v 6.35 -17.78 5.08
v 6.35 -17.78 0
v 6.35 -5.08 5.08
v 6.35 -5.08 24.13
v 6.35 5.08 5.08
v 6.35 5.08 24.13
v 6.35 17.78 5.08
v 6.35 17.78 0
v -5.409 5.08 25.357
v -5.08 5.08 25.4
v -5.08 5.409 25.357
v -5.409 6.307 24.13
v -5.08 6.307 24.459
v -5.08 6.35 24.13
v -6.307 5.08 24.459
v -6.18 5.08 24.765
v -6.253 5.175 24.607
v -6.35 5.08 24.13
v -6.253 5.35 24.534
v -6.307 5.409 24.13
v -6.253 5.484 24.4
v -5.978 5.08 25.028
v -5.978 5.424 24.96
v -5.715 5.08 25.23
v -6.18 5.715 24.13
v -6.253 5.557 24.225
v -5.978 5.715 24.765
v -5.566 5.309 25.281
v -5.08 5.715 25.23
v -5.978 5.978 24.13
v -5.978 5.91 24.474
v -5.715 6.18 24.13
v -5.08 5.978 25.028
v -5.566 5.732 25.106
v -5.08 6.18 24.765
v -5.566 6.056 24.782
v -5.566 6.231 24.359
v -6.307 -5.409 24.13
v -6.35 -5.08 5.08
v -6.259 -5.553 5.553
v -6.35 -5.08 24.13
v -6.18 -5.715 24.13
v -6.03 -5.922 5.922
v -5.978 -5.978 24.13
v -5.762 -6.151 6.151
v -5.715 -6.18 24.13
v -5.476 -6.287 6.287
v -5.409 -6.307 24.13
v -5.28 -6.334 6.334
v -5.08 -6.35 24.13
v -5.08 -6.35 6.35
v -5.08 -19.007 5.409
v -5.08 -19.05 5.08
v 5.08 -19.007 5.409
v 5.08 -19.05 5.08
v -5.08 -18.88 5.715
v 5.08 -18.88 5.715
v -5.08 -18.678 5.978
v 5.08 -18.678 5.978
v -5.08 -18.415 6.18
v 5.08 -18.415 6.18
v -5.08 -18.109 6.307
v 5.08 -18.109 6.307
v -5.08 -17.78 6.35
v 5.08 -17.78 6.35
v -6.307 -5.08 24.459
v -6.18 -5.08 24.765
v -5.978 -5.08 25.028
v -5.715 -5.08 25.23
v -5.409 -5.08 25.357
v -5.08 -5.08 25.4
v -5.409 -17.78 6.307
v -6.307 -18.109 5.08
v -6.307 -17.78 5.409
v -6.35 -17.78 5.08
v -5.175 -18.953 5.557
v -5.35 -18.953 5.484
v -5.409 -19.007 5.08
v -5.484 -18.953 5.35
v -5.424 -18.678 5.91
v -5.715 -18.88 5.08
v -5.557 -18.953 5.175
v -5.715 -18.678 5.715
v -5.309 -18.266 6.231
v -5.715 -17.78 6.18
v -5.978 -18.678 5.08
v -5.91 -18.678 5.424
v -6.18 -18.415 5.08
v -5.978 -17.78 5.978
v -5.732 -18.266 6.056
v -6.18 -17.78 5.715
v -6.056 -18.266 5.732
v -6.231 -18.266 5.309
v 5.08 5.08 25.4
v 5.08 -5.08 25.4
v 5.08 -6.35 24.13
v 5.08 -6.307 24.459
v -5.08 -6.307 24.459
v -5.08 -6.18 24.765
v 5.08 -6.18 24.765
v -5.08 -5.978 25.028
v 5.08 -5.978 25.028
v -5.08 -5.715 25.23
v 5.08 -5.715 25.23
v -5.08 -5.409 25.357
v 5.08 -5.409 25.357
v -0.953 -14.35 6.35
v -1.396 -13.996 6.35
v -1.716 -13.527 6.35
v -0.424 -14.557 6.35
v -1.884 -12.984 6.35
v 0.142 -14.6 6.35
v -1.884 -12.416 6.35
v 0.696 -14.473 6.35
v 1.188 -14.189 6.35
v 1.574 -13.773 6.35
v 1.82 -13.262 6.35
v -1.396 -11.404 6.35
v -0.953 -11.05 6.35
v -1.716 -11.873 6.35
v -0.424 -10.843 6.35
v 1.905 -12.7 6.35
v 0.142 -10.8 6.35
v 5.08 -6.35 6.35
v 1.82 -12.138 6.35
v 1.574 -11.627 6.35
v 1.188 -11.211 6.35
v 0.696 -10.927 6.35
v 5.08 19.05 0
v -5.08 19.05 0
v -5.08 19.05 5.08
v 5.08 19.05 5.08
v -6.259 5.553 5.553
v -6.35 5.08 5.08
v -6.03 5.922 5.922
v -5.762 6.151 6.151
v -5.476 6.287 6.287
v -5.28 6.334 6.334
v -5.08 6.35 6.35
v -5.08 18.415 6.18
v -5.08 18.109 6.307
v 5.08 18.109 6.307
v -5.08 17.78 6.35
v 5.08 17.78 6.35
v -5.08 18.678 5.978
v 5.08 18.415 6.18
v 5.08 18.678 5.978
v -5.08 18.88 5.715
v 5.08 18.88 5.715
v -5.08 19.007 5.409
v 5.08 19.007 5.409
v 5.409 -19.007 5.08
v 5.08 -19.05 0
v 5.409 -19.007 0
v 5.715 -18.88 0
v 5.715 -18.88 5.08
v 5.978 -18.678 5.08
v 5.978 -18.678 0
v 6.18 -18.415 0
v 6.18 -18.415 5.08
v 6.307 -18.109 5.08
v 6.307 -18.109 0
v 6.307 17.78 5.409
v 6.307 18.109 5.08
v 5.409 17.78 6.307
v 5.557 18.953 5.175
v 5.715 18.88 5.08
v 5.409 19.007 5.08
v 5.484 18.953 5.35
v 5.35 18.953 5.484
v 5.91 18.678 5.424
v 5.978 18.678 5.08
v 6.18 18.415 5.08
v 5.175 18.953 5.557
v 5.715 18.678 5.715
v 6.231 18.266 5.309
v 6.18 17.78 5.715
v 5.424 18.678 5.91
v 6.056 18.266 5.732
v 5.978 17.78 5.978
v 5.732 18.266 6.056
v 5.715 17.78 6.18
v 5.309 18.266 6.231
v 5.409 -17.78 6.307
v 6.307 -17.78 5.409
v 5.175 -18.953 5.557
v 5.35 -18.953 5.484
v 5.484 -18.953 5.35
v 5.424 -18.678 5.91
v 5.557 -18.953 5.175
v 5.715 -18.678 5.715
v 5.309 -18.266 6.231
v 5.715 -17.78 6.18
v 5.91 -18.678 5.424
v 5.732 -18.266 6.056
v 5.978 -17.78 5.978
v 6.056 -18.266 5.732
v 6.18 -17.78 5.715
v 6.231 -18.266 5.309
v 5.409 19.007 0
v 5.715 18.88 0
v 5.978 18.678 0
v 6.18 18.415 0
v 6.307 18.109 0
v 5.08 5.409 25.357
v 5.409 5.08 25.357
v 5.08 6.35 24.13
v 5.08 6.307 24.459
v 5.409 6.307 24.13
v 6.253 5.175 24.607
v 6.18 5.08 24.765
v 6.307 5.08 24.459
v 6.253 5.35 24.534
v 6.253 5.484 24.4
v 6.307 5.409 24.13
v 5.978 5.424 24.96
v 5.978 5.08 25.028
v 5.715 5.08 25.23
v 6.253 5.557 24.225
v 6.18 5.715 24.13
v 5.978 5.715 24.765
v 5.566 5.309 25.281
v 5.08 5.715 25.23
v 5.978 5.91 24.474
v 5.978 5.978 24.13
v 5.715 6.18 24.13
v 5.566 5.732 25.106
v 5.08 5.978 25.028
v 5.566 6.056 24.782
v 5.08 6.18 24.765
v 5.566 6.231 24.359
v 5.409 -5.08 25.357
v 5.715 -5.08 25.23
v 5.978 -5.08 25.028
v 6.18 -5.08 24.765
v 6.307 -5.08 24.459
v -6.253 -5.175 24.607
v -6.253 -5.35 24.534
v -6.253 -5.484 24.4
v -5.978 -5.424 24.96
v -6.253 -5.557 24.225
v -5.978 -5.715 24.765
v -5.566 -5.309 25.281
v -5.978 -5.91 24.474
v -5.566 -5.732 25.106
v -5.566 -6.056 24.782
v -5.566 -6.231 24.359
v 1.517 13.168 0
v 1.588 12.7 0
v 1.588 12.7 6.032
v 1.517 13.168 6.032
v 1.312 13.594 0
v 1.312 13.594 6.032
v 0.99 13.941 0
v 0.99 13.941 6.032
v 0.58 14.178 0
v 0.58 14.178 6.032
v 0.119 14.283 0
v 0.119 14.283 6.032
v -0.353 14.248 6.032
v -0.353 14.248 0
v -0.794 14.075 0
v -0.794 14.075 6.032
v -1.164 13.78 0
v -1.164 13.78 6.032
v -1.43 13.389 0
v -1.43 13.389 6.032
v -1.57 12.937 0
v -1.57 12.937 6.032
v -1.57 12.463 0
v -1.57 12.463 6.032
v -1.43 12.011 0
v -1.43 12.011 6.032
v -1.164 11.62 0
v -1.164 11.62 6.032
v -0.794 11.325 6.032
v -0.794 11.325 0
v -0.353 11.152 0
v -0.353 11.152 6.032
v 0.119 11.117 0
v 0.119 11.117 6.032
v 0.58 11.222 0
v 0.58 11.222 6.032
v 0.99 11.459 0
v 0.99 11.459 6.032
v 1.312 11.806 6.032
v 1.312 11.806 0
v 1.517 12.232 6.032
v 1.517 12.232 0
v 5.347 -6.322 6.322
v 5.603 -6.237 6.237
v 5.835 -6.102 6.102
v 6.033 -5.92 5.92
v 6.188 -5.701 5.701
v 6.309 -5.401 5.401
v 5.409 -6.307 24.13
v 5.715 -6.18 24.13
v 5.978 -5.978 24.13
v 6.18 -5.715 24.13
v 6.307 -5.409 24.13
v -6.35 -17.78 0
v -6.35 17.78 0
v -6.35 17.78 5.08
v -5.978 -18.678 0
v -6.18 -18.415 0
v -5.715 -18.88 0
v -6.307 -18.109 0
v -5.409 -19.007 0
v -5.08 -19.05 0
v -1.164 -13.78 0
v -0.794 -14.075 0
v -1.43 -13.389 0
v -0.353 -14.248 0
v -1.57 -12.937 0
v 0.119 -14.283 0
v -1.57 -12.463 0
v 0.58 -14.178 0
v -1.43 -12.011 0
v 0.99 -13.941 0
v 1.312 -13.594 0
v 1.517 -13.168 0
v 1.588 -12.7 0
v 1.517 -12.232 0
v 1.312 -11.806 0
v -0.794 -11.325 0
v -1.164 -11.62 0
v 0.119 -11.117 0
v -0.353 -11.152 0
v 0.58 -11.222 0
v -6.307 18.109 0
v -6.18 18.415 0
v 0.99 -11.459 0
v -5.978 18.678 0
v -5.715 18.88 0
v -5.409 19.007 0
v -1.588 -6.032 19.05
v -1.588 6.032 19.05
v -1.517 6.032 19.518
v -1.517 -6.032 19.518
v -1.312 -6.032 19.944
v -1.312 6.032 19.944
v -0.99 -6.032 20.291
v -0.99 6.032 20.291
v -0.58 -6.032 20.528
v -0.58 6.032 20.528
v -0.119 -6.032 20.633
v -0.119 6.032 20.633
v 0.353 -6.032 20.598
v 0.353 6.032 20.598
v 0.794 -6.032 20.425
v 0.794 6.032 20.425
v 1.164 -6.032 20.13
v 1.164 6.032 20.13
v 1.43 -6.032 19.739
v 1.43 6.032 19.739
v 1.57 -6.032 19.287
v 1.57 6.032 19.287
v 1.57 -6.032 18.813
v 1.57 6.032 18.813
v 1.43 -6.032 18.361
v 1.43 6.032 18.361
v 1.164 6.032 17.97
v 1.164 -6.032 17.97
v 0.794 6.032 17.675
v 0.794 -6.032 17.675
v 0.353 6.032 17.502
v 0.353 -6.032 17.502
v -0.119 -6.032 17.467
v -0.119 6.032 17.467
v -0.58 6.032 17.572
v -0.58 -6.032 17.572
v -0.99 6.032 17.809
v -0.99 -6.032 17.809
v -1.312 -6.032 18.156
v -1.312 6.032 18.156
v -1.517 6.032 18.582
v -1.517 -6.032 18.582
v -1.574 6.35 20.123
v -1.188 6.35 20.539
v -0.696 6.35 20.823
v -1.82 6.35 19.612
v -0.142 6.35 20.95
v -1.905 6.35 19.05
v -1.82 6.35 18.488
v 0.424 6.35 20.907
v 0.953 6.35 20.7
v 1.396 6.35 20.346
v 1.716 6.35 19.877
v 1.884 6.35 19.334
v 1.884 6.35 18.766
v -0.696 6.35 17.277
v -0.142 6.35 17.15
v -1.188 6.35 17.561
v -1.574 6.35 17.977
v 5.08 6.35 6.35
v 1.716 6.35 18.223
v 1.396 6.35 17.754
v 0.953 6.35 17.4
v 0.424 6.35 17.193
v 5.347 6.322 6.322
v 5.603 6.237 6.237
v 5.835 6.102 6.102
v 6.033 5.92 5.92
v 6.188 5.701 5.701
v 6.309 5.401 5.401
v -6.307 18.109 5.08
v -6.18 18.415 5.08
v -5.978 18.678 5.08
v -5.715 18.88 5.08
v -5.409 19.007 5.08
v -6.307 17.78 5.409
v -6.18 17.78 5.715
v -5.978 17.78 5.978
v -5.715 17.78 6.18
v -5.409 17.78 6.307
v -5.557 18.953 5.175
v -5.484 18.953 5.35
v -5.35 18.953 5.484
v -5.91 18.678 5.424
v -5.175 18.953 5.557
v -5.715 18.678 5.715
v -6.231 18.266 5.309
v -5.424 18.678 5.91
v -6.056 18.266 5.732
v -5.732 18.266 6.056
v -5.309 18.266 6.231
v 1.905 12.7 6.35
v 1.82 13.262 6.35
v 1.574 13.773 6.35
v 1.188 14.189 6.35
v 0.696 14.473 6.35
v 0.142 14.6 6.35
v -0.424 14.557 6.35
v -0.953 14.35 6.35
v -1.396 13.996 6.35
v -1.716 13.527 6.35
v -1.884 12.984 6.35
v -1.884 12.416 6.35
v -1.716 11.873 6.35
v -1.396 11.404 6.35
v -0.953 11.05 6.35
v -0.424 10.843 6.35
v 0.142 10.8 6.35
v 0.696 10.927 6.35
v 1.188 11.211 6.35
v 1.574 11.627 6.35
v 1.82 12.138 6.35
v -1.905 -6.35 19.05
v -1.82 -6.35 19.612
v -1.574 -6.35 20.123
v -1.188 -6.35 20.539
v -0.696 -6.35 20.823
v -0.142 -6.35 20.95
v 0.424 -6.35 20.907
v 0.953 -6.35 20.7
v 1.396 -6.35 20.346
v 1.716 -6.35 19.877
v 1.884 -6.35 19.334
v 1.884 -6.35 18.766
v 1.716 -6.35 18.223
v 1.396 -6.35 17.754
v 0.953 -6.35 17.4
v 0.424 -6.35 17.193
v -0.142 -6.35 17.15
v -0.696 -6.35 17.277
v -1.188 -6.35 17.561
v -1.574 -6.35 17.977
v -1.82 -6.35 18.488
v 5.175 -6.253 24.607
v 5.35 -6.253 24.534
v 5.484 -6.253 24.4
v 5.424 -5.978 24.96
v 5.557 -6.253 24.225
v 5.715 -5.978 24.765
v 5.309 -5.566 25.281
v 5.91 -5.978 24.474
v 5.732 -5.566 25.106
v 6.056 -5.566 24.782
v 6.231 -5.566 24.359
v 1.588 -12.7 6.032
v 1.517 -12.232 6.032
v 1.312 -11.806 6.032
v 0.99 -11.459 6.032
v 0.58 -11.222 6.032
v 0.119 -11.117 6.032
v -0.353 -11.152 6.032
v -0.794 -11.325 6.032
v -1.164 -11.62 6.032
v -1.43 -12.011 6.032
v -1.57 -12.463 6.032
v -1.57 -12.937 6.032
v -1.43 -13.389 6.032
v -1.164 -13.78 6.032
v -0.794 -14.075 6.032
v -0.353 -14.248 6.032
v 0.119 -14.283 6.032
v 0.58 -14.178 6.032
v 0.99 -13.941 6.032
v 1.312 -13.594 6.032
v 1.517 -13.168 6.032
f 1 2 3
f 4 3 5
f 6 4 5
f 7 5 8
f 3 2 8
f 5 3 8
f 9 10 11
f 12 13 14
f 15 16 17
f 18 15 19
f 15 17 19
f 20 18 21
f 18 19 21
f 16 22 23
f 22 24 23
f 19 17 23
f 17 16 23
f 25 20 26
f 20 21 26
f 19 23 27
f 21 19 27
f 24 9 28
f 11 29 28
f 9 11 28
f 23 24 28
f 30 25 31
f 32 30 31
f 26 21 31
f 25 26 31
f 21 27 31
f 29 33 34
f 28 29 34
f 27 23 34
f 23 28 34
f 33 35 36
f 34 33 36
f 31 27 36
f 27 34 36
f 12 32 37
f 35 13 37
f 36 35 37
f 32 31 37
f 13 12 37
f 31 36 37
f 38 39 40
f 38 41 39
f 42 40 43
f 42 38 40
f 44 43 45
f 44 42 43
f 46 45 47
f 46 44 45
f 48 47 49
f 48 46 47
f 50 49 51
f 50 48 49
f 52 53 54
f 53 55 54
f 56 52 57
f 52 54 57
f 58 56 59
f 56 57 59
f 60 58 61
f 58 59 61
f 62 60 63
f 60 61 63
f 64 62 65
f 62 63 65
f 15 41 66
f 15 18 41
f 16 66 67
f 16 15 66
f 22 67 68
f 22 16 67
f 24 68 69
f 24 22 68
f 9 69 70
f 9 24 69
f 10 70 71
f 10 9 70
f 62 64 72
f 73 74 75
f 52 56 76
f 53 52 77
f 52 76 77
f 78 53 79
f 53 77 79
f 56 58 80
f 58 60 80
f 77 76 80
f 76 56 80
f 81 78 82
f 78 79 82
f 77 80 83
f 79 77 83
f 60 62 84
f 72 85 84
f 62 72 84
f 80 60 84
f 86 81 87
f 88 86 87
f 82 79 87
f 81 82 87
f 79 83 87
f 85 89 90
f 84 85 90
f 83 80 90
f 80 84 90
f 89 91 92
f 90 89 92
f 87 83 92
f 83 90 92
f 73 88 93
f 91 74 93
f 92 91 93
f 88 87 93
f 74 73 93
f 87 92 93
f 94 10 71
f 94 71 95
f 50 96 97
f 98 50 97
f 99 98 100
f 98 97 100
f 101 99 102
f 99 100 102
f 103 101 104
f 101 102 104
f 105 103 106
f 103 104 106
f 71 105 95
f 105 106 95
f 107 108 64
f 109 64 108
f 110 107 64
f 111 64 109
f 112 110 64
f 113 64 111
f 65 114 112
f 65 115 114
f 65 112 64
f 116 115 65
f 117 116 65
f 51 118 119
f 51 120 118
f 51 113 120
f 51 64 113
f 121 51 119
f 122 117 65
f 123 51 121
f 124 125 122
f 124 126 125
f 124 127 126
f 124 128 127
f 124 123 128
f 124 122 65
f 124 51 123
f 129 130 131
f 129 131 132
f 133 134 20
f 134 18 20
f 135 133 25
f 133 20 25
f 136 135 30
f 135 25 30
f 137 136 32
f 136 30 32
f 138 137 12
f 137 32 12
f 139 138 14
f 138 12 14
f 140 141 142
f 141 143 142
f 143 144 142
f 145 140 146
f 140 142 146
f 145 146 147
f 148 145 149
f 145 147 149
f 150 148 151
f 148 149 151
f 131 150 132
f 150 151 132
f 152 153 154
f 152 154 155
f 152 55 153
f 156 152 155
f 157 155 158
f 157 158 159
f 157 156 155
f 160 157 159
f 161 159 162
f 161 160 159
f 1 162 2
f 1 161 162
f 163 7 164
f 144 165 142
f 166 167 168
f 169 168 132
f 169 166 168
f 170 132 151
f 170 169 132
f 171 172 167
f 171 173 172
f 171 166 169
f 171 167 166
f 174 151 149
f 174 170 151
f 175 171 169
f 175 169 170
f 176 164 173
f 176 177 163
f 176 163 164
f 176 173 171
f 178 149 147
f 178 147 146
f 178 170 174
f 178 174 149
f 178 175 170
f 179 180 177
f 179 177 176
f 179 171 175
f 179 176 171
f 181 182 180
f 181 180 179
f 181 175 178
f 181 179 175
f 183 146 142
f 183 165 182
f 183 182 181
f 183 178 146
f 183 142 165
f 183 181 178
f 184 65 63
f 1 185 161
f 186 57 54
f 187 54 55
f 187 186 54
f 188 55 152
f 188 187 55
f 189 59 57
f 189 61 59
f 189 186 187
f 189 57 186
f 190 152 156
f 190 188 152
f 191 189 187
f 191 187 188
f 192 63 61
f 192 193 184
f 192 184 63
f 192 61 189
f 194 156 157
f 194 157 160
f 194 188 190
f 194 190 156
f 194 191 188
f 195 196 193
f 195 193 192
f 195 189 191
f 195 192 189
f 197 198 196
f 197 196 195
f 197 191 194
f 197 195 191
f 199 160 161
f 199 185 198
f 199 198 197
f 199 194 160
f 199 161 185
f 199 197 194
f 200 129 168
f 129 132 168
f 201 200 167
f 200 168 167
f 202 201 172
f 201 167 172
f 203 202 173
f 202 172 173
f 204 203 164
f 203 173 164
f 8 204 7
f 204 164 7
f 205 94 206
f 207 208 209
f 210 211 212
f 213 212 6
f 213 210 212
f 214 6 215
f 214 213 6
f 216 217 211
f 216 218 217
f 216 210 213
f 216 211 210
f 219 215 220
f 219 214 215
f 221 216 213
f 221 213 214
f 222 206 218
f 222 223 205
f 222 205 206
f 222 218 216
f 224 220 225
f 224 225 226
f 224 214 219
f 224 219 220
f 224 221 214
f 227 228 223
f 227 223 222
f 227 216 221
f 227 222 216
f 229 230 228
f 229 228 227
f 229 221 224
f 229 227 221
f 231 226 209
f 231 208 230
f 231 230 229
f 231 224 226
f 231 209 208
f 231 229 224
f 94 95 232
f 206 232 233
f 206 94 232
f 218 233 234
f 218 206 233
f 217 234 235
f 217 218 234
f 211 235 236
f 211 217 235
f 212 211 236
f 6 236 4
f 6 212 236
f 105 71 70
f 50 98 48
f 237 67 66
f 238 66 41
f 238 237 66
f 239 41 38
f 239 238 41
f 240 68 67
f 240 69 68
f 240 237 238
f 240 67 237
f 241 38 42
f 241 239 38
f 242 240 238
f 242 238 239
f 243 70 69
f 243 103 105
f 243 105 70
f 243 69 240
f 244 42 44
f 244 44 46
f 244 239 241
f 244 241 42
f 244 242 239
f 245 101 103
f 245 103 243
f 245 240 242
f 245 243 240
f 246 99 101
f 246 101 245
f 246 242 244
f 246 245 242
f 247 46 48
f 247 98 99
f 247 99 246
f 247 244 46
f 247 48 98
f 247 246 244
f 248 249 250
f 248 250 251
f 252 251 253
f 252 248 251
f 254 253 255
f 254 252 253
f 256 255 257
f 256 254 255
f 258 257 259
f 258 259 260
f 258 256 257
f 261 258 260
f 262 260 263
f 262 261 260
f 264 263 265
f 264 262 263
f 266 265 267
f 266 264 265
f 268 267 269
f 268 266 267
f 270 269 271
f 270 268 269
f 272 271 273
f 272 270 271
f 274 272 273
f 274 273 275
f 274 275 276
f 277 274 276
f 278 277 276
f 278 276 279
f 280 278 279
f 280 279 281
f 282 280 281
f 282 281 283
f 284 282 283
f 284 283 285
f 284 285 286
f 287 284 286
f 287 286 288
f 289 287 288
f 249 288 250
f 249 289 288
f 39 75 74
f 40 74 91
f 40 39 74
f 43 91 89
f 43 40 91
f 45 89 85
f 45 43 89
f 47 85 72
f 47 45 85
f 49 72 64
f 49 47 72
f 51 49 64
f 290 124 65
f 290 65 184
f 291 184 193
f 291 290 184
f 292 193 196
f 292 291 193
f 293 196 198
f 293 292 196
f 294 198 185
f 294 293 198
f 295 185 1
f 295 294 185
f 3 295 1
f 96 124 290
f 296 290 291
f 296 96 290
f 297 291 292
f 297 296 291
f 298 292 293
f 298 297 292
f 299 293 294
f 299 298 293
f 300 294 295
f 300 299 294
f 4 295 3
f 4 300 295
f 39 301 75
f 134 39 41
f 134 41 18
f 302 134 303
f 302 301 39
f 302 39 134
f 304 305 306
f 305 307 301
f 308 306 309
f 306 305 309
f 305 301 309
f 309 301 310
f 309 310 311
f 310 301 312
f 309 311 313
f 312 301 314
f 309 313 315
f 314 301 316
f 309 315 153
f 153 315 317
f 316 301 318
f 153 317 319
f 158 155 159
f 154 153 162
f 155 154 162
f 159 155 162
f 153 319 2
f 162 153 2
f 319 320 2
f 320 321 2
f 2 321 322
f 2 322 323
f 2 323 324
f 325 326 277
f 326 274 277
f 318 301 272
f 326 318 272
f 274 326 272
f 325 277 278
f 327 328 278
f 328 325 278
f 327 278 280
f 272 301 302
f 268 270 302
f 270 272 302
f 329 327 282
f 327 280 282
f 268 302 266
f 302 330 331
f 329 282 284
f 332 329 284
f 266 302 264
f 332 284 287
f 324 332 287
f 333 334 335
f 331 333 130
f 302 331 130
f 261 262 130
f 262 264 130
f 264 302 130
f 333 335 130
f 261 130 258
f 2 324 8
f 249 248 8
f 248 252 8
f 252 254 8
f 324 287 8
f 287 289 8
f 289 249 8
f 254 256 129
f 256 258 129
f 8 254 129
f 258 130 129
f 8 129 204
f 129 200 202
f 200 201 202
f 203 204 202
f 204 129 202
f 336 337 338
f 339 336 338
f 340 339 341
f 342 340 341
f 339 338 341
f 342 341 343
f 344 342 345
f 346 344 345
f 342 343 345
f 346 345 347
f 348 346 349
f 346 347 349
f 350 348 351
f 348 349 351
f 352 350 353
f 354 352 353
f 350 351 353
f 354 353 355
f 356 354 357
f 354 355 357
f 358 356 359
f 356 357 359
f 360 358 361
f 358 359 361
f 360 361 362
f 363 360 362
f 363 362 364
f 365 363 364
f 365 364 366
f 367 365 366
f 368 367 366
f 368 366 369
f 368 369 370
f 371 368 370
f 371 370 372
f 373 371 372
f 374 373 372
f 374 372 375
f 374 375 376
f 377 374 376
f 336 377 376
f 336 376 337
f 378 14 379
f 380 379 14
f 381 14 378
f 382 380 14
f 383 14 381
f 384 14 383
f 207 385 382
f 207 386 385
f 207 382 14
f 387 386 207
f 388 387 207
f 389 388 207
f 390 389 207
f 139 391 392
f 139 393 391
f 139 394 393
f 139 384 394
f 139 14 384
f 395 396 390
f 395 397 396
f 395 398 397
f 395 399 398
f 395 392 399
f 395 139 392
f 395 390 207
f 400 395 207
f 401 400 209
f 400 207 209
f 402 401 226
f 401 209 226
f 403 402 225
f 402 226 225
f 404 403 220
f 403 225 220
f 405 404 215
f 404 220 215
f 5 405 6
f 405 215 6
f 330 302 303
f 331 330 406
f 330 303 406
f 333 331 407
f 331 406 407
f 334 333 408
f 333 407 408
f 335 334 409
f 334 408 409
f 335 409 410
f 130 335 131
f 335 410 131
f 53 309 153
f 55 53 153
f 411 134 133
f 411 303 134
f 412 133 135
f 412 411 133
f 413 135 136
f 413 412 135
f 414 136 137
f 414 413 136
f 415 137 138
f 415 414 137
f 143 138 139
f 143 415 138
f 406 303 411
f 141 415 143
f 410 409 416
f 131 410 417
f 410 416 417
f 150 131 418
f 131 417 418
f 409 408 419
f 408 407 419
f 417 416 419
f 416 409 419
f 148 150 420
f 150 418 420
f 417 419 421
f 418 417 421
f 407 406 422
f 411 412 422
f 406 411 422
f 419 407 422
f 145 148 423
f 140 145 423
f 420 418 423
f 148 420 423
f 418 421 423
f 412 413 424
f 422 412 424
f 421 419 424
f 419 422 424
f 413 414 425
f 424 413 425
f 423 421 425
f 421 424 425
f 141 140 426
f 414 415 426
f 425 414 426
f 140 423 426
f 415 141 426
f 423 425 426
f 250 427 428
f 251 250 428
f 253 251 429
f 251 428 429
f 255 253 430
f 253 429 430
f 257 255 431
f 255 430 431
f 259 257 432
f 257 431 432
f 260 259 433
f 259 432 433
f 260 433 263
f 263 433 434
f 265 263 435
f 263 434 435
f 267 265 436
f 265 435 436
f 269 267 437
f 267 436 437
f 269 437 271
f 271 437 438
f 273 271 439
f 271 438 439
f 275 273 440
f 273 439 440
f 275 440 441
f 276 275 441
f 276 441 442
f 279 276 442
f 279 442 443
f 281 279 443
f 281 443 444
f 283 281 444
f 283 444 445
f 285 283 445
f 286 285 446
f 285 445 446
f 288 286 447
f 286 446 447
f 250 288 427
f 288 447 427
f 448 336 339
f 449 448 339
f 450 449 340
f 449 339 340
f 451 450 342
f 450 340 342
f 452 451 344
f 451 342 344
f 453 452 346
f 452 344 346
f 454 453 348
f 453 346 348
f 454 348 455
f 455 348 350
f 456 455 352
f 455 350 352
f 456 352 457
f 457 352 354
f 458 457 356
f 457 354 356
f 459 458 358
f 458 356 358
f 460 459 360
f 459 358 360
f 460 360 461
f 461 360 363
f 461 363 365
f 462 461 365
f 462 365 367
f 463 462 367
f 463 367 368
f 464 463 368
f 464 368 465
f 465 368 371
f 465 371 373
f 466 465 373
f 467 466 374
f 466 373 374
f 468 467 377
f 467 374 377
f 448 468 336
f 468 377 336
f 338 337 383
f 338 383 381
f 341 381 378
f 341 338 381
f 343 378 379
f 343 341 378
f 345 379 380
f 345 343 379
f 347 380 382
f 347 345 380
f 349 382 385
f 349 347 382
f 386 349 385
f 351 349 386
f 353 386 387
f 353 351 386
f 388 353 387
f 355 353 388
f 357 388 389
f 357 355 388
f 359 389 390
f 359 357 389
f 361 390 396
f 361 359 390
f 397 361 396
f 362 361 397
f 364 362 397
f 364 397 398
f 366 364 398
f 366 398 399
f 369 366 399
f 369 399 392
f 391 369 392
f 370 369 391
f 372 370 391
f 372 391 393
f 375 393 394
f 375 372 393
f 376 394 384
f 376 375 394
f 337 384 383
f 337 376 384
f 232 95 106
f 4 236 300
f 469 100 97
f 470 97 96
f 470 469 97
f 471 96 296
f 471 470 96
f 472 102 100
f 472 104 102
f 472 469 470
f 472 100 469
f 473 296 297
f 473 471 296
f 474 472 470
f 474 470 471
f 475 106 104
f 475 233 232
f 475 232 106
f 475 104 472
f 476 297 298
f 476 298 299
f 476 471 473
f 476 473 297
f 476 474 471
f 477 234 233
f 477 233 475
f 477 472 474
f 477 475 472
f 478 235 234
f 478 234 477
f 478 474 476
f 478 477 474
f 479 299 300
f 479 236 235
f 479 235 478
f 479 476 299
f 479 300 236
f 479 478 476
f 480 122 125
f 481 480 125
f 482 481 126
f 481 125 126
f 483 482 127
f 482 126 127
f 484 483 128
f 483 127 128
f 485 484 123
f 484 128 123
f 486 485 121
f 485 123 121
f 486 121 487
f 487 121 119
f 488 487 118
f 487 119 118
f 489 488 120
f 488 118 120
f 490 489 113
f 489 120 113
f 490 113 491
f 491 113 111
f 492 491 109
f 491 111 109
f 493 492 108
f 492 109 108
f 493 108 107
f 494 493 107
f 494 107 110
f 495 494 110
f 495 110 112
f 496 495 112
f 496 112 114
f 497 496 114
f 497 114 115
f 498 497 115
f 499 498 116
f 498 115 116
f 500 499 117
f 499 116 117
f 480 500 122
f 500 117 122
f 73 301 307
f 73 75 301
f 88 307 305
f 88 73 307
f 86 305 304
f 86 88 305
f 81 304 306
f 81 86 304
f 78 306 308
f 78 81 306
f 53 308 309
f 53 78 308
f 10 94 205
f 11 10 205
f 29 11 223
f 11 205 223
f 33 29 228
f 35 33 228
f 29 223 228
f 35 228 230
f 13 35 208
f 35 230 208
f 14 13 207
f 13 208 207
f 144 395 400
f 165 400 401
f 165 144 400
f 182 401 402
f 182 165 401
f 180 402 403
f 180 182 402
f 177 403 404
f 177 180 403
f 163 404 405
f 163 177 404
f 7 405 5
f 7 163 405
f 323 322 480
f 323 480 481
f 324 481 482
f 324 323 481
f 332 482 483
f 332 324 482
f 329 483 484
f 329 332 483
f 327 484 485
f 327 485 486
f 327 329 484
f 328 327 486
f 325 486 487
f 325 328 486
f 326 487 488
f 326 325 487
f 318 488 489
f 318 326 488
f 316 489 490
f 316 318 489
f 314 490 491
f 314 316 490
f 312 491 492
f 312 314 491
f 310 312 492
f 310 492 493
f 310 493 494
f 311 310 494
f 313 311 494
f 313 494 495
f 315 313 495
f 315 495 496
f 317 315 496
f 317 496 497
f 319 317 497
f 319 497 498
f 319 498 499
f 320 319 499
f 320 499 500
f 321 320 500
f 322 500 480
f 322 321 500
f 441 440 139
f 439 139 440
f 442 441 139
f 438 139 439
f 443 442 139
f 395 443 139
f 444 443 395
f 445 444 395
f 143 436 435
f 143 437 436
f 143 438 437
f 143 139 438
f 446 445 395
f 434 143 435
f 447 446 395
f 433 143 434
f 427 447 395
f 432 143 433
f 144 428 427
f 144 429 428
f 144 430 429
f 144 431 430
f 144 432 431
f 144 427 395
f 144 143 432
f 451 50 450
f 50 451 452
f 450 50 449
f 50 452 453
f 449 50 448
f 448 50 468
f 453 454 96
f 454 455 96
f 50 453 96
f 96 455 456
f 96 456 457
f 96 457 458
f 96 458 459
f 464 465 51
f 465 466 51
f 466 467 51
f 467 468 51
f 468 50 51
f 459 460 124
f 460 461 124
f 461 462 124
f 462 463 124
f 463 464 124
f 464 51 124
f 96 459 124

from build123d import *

# Parameters (mm, degrees)
F0_W     = 12.7
F0_H     = 12.7
F0_R     = 1.5875
F1_DEPTH = 6.35
F2_DEPTH = 25.4
F3_R     = 1.5875
F4_DEPTH = 25.4
F5_R     = 1.27
F6_SIZE  = 0.3175


with BuildPart() as f1:
    # F0 (on Top) → F1 (new body)
    with BuildSketch(Plane.XY):
        with Locations((0, 12.7)):
            Rectangle(F0_W, F0_H)
        with Locations((0, 12.7)):
            Circle(F0_R, mode=Mode.SUBTRACT)
    extrude(amount=F1_DEPTH)



with BuildPart() as f1b:
    # F0 (on Top) → F1, piece 2 (new body)
    with BuildSketch(Plane.XY):
        with Locations((0, -12.7)):
            Rectangle(F0_W, F0_H)
        with Locations((0, -12.7)):
            Circle(F0_R, mode=Mode.SUBTRACT)
    extrude(amount=F1_DEPTH)


with BuildPart() as f1_1:
    add(f1.part)

    add(f1b.part)  # F2 merges F1b
    # F0 (on Top) → F2 (join)
    with BuildSketch(Plane.XY):
        Rectangle(F0_W, F0_H)
    extrude(amount=F2_DEPTH)

    # F3 (on face) → F4 (cut)
    with BuildSketch(Plane(origin=(0, 6.35, 0), x_dir=(-1, 0, 0), z_dir=(0, 1, 0))):
        with Locations((0, 19.05)):
            Circle(F3_R)
    extrude(amount=-F4_DEPTH, mode=Mode.SUBTRACT)

    # F5
    f5_edges = [f1_1.edges().sort_by_distance(p)[0] for p in [
        (0, 6.35, 25.4),
        (6.35, 0, 25.4),
        (0, -6.35, 25.4),
        (-6.35, 0, 25.4),
        (6.35, 6.35, 15.875),
        (6.35, -6.35, 15.875),
        (6.35, -12.7, 6.35),
        (6.35, 12.7, 6.35),
        (-6.35, 6.35, 15.875),
        (-6.35, 12.7, 6.35),
        (-6.35, -6.35, 15.875),
        (-6.35, -12.7, 6.35),
        (0, -19.05, 6.35),
        (-6.35, -19.05, 3.175),
        (6.35, -19.05, 3.175),
        (6.35, 19.05, 3.175),
        (-6.35, 19.05, 3.175),
        (0, 19.05, 6.35),
    ]]
    fillet(f5_edges, radius=F5_R)

    # F6
    f6_edges = [f1_1.edges().sort_by_distance(p)[0] for p in [
        (-1.5875, -12.7, 6.35),
        (-1.5875, 12.7, 6.35),
        (1.5875, 6.35, 19.05),
        (1.5875, -6.35, 19.05),
    ]]
    chamfer(f6_edges, length=F6_SIZE)


solid = f1_1.part
